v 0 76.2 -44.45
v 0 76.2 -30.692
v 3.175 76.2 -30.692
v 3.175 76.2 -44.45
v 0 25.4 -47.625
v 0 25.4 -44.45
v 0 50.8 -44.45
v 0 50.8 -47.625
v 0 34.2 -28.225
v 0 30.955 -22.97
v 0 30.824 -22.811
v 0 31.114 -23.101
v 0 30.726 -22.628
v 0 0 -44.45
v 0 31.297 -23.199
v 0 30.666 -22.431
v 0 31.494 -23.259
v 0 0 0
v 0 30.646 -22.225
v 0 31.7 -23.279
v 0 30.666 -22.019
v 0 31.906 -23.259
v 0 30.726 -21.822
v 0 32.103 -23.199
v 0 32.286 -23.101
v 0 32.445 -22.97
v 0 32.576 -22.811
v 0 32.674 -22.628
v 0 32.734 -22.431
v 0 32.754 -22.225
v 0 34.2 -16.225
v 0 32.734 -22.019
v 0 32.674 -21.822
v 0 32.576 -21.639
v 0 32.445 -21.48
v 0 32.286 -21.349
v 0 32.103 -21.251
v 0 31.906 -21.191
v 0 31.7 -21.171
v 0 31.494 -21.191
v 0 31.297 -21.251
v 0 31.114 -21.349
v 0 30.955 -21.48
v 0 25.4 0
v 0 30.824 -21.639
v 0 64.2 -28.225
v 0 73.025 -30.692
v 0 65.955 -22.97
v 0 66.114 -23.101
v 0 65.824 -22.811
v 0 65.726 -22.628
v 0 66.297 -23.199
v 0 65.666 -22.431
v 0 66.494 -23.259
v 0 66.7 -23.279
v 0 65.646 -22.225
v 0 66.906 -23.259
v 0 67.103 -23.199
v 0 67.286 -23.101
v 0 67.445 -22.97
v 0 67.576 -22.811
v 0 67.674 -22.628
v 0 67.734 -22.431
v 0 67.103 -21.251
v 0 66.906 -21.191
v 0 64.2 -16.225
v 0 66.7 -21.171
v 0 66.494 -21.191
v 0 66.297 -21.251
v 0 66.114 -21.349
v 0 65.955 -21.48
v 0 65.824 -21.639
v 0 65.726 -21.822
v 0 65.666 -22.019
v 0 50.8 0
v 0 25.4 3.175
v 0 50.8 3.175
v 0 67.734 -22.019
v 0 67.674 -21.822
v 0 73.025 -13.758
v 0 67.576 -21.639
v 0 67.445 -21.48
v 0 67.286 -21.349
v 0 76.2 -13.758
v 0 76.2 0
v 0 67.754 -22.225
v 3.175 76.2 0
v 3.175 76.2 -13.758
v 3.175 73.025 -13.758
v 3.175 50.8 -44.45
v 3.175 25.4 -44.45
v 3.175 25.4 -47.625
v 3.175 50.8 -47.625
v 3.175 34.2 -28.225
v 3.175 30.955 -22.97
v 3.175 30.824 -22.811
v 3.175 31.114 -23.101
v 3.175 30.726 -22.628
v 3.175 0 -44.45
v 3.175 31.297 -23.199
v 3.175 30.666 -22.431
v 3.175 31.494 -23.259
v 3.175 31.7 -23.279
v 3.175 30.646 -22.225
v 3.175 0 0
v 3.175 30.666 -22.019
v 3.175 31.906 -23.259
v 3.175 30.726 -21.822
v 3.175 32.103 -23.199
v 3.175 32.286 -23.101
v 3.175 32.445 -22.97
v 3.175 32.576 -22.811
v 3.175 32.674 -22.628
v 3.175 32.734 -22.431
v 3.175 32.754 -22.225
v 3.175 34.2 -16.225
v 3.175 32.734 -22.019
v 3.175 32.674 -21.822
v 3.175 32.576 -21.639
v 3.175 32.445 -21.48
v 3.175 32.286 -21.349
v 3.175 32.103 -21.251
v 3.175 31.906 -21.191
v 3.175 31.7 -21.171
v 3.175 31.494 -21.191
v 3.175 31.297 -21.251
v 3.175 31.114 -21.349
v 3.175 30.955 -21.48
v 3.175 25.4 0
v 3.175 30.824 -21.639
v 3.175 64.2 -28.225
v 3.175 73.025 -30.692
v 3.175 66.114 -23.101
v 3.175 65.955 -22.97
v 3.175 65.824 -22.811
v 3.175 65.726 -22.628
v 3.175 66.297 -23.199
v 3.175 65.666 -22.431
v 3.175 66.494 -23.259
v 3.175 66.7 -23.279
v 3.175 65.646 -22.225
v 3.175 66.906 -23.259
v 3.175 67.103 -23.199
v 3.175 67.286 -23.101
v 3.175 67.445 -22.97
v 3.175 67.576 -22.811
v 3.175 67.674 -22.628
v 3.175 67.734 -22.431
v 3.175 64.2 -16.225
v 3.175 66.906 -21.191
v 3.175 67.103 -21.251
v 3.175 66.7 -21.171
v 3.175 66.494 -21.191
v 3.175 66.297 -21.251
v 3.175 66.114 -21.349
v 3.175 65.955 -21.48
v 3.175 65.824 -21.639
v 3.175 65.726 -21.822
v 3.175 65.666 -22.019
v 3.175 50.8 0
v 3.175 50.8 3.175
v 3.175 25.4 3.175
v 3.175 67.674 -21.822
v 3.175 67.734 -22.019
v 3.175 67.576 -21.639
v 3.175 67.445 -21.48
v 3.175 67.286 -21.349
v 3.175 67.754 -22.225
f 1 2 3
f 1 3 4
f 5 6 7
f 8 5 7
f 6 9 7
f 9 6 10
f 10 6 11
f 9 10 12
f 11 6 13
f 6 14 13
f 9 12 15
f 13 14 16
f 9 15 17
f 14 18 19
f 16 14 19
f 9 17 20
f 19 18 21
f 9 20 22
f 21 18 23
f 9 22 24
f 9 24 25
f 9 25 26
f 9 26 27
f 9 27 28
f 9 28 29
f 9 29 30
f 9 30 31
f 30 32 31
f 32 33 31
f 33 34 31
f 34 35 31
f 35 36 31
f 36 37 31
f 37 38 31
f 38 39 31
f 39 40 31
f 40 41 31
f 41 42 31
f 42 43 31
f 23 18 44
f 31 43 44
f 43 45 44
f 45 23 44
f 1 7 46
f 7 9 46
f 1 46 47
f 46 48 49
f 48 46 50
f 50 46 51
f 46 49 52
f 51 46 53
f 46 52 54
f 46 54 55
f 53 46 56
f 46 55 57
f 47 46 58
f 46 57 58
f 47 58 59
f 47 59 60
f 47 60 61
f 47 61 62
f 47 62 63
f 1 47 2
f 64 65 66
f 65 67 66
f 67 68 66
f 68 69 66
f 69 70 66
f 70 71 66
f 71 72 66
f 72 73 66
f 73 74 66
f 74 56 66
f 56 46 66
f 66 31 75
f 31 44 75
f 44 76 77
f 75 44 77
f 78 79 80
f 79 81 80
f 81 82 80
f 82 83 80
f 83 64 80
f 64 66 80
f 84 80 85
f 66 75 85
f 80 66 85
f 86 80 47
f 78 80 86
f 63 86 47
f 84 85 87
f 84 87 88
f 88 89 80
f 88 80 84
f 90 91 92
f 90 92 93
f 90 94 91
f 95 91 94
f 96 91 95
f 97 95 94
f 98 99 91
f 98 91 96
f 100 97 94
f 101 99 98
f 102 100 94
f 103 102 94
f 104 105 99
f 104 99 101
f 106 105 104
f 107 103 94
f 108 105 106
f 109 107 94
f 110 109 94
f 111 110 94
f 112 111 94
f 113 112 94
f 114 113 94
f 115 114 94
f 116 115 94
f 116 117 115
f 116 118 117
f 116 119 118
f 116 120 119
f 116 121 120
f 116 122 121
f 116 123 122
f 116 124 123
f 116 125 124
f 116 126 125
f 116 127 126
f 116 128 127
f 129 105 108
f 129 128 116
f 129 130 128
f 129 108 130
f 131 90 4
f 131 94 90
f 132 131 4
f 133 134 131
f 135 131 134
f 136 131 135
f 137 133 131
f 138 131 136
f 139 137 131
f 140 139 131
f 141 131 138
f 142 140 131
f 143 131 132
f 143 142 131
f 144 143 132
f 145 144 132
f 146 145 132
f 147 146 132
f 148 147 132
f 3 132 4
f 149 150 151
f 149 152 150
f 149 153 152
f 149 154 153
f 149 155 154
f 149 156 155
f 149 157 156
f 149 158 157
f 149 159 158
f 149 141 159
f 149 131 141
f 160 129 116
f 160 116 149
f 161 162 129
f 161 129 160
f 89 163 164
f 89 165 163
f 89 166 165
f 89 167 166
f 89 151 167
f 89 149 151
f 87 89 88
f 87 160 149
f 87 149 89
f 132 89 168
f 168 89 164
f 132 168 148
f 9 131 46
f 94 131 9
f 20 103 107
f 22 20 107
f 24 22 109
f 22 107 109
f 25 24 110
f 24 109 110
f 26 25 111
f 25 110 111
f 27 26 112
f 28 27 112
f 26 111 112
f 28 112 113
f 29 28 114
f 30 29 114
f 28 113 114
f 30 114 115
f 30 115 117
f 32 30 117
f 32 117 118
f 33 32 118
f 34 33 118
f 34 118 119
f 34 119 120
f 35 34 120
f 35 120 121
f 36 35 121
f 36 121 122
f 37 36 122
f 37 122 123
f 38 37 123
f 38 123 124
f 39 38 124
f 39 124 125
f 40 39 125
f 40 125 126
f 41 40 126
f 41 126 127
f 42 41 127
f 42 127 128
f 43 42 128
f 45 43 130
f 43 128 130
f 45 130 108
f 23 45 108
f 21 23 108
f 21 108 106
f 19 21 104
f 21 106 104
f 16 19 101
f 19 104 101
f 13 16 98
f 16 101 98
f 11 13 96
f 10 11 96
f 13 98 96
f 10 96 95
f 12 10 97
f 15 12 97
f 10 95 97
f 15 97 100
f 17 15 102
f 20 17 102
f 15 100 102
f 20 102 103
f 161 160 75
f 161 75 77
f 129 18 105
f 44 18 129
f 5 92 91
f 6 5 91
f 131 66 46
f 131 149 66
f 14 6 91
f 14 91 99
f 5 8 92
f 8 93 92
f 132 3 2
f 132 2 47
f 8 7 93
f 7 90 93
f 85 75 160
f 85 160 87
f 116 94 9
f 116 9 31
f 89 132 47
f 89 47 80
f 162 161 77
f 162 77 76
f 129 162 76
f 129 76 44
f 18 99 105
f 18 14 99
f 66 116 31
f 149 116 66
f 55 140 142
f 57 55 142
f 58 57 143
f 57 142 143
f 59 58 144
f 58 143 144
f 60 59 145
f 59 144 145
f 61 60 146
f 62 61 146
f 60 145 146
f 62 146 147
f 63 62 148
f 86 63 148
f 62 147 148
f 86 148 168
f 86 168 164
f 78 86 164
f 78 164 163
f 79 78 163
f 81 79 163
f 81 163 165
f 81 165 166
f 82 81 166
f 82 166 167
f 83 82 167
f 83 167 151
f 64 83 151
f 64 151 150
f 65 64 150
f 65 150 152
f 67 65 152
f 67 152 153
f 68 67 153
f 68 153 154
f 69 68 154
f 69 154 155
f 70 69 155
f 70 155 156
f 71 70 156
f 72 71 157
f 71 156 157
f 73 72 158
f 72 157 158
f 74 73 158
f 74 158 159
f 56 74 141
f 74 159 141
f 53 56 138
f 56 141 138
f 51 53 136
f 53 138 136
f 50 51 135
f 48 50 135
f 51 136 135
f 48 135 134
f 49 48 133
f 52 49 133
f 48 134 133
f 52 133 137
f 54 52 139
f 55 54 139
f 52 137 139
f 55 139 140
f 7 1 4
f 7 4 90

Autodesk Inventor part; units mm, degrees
ref_plane "YZ Plane" through (0, 0, 0) normal (1, 0, 0) x (0, 1, 0)
ref_plane "XZ Plane" through (0, 0, 0) normal (0, 1, 0) x (-1, 0, 0)
ref_plane "XY Plane" through (0, 0, 0) normal (0, 0, 1) x (1, 0, 0)
sketch "Sketch1" plane through (0, 0, 0) normal (1, 0, 0) x (0, 1, 0)
  line L0 (0, 0) -> (76.2, 0)
  line L1 (76.2, 0) -> (76.2, -44.45)
  line L2 (76.2, -44.45) -> (0, -44.45)
  line L3 (0, -44.45) -> (0, 0)
  dimension "d0" = 76.2
  dimension "d1" = 44.45
extrude "Extrusion1" add sketch "Sketch1" along normal blind 3.175
sketch "Sketch2" plane through (3.175, 0, 0) normal (1, 0, 0) x (0, 0, -1)
  line L0 (44.45, 76.2) -> (0, 76.2) projected
  line L1 (13.7583, 76.2) -> (30.6917, 76.2)
  line L2 (30.6917, 76.2) -> (30.6917, 73.025)
  line L3 (30.6917, 73.025) -> (13.7583, 73.025)
  line L4 (13.7583, 73.025) -> (13.7583, 76.2)
  line L5 (0, 76.2) -> (0, 0) projected
  dimension "d4" = 16.9333
  dimension "d5" = 3.175
  dimension "d8" = 13.7583
extrude "Extrusion2" cut sketch "Sketch2" against normal blind 3.175
sketch "Sketch3" plane through (3.175, 0, 0) normal (1, 0, 0) x (0, 0, -1)
  line L0 (0, 76.2) -> (0, 0) projected
  line L1 (0, 0) -> (44.45, 0) projected
  line L2 (44.45, 0) -> (44.45, 76.2) projected
  line L3 (44.45, 50.8) -> (47.625, 50.8)
  line L4 (47.625, 50.8) -> (47.625, 25.4)
  line L5 (47.625, 25.4) -> (44.45, 25.4)
  line L6 (44.45, 25.4) -> (44.45, 50.8)
  line L7 (0, 50.8) -> (-3.175, 50.8)
  line L8 (-3.175, 50.8) -> (-3.175, 25.4)
  line L9 (-3.175, 25.4) -> (0, 25.4)
  line L10 (0, 25.4) -> (0, 50.8)
  dimension "d9" = 3.175
  dimension "d10" = 25.4
  dimension "d11" = 25.4
  dimension "d12" = 3.175
  dimension "d13" = 25.4
extrude "Extrusion3" add sketch "Sketch3" against normal blind 3.175
sketch "Sketch4" plane through (3.175, 0, 0) normal (1, 0, 0) x (0, 0, -1)
  line L0 (-3.175, 50.8) -> (-3.175, 25.4) projected
  line L1 (44.45, 76.2) -> (30.6917, 76.2) projected
  line L2 (16.225, 64.2) -> (28.225, 64.2)
  line L3 (28.225, 64.2) -> (28.225, 34.2)
  line L4 (28.225, 34.2) -> (16.225, 34.2)
  line L5 (16.225, 34.2) -> (16.225, 64.2)
  circle A0 centre (22.225, 66.7) radius 1.0541
  circle A1 centre (22.225, 31.7) radius 1.0541
  dimension "d16" = 12
  dimension "d17" = 30
  dimension "d19" = 19.4
  dimension "d20" = 12
  dimension "d21" = 2.1082
  dimension "d22" = 6
  dimension "d23" = 2.5
  dimension "d24" = 2.1082
  dimension "d25" = 6
  dimension "d26" = 2.5
extrude "Extrusion4" cut sketch "Sketch4" against normal blind 3.175
equation "\"d0\" = height"
equation "\"d1\" = depth - 2 * thick"
equation "\"d2\" = thick"
equation "\"d4\" = 0.333333 * depth"
equation "\"d5\" = thick"
equation "\"d8\" = 0.333333 * depth - thick"
equation "\"d6\" = thick"
equation "\"d9\" = thick"
equation "\"d10\" = 0.333333 * height"
equation "\"d11\" = 0.333333 * height"
equation "\"d12\" = thick"
equation "\"d13\" = 0.333333 * height"
equation "\"d14\" = thick"
equation "\"d16\" = servoWidth"
equation "\"d17\" = servoLength"
equation "\"d19\" = -0.5 * servoWidth + 0.5 * depth"
equation "\"d20\" = servoOffset"
equation "\"d21\" = servoHole"
equation "\"d22\" = 0.5 * servoWidth"
equation "\"d23\" = -0.5 * servoLength + 0.5 * servoDist"
equation "\"d24\" = servoHole"
equation "\"d25\" = 0.5 * servoWidth"
equation "\"d26\" = -0.5 * servoLength + 0.5 * servoDist"
equation "\"d27\" = thick"
equation "\"height\" = 76.2"
equation "\"thick\" = 3.175"
equation "\"depth\" = 50.8"
equation "\"servoLength\" = 30"
equation "\"servoWidth\" = 12"
equation "\"servoOffset\" = 12"
equation "\"servoDist\" = 35"
equation "\"servoHole\" = 2.1082"
properties part number "Side"
